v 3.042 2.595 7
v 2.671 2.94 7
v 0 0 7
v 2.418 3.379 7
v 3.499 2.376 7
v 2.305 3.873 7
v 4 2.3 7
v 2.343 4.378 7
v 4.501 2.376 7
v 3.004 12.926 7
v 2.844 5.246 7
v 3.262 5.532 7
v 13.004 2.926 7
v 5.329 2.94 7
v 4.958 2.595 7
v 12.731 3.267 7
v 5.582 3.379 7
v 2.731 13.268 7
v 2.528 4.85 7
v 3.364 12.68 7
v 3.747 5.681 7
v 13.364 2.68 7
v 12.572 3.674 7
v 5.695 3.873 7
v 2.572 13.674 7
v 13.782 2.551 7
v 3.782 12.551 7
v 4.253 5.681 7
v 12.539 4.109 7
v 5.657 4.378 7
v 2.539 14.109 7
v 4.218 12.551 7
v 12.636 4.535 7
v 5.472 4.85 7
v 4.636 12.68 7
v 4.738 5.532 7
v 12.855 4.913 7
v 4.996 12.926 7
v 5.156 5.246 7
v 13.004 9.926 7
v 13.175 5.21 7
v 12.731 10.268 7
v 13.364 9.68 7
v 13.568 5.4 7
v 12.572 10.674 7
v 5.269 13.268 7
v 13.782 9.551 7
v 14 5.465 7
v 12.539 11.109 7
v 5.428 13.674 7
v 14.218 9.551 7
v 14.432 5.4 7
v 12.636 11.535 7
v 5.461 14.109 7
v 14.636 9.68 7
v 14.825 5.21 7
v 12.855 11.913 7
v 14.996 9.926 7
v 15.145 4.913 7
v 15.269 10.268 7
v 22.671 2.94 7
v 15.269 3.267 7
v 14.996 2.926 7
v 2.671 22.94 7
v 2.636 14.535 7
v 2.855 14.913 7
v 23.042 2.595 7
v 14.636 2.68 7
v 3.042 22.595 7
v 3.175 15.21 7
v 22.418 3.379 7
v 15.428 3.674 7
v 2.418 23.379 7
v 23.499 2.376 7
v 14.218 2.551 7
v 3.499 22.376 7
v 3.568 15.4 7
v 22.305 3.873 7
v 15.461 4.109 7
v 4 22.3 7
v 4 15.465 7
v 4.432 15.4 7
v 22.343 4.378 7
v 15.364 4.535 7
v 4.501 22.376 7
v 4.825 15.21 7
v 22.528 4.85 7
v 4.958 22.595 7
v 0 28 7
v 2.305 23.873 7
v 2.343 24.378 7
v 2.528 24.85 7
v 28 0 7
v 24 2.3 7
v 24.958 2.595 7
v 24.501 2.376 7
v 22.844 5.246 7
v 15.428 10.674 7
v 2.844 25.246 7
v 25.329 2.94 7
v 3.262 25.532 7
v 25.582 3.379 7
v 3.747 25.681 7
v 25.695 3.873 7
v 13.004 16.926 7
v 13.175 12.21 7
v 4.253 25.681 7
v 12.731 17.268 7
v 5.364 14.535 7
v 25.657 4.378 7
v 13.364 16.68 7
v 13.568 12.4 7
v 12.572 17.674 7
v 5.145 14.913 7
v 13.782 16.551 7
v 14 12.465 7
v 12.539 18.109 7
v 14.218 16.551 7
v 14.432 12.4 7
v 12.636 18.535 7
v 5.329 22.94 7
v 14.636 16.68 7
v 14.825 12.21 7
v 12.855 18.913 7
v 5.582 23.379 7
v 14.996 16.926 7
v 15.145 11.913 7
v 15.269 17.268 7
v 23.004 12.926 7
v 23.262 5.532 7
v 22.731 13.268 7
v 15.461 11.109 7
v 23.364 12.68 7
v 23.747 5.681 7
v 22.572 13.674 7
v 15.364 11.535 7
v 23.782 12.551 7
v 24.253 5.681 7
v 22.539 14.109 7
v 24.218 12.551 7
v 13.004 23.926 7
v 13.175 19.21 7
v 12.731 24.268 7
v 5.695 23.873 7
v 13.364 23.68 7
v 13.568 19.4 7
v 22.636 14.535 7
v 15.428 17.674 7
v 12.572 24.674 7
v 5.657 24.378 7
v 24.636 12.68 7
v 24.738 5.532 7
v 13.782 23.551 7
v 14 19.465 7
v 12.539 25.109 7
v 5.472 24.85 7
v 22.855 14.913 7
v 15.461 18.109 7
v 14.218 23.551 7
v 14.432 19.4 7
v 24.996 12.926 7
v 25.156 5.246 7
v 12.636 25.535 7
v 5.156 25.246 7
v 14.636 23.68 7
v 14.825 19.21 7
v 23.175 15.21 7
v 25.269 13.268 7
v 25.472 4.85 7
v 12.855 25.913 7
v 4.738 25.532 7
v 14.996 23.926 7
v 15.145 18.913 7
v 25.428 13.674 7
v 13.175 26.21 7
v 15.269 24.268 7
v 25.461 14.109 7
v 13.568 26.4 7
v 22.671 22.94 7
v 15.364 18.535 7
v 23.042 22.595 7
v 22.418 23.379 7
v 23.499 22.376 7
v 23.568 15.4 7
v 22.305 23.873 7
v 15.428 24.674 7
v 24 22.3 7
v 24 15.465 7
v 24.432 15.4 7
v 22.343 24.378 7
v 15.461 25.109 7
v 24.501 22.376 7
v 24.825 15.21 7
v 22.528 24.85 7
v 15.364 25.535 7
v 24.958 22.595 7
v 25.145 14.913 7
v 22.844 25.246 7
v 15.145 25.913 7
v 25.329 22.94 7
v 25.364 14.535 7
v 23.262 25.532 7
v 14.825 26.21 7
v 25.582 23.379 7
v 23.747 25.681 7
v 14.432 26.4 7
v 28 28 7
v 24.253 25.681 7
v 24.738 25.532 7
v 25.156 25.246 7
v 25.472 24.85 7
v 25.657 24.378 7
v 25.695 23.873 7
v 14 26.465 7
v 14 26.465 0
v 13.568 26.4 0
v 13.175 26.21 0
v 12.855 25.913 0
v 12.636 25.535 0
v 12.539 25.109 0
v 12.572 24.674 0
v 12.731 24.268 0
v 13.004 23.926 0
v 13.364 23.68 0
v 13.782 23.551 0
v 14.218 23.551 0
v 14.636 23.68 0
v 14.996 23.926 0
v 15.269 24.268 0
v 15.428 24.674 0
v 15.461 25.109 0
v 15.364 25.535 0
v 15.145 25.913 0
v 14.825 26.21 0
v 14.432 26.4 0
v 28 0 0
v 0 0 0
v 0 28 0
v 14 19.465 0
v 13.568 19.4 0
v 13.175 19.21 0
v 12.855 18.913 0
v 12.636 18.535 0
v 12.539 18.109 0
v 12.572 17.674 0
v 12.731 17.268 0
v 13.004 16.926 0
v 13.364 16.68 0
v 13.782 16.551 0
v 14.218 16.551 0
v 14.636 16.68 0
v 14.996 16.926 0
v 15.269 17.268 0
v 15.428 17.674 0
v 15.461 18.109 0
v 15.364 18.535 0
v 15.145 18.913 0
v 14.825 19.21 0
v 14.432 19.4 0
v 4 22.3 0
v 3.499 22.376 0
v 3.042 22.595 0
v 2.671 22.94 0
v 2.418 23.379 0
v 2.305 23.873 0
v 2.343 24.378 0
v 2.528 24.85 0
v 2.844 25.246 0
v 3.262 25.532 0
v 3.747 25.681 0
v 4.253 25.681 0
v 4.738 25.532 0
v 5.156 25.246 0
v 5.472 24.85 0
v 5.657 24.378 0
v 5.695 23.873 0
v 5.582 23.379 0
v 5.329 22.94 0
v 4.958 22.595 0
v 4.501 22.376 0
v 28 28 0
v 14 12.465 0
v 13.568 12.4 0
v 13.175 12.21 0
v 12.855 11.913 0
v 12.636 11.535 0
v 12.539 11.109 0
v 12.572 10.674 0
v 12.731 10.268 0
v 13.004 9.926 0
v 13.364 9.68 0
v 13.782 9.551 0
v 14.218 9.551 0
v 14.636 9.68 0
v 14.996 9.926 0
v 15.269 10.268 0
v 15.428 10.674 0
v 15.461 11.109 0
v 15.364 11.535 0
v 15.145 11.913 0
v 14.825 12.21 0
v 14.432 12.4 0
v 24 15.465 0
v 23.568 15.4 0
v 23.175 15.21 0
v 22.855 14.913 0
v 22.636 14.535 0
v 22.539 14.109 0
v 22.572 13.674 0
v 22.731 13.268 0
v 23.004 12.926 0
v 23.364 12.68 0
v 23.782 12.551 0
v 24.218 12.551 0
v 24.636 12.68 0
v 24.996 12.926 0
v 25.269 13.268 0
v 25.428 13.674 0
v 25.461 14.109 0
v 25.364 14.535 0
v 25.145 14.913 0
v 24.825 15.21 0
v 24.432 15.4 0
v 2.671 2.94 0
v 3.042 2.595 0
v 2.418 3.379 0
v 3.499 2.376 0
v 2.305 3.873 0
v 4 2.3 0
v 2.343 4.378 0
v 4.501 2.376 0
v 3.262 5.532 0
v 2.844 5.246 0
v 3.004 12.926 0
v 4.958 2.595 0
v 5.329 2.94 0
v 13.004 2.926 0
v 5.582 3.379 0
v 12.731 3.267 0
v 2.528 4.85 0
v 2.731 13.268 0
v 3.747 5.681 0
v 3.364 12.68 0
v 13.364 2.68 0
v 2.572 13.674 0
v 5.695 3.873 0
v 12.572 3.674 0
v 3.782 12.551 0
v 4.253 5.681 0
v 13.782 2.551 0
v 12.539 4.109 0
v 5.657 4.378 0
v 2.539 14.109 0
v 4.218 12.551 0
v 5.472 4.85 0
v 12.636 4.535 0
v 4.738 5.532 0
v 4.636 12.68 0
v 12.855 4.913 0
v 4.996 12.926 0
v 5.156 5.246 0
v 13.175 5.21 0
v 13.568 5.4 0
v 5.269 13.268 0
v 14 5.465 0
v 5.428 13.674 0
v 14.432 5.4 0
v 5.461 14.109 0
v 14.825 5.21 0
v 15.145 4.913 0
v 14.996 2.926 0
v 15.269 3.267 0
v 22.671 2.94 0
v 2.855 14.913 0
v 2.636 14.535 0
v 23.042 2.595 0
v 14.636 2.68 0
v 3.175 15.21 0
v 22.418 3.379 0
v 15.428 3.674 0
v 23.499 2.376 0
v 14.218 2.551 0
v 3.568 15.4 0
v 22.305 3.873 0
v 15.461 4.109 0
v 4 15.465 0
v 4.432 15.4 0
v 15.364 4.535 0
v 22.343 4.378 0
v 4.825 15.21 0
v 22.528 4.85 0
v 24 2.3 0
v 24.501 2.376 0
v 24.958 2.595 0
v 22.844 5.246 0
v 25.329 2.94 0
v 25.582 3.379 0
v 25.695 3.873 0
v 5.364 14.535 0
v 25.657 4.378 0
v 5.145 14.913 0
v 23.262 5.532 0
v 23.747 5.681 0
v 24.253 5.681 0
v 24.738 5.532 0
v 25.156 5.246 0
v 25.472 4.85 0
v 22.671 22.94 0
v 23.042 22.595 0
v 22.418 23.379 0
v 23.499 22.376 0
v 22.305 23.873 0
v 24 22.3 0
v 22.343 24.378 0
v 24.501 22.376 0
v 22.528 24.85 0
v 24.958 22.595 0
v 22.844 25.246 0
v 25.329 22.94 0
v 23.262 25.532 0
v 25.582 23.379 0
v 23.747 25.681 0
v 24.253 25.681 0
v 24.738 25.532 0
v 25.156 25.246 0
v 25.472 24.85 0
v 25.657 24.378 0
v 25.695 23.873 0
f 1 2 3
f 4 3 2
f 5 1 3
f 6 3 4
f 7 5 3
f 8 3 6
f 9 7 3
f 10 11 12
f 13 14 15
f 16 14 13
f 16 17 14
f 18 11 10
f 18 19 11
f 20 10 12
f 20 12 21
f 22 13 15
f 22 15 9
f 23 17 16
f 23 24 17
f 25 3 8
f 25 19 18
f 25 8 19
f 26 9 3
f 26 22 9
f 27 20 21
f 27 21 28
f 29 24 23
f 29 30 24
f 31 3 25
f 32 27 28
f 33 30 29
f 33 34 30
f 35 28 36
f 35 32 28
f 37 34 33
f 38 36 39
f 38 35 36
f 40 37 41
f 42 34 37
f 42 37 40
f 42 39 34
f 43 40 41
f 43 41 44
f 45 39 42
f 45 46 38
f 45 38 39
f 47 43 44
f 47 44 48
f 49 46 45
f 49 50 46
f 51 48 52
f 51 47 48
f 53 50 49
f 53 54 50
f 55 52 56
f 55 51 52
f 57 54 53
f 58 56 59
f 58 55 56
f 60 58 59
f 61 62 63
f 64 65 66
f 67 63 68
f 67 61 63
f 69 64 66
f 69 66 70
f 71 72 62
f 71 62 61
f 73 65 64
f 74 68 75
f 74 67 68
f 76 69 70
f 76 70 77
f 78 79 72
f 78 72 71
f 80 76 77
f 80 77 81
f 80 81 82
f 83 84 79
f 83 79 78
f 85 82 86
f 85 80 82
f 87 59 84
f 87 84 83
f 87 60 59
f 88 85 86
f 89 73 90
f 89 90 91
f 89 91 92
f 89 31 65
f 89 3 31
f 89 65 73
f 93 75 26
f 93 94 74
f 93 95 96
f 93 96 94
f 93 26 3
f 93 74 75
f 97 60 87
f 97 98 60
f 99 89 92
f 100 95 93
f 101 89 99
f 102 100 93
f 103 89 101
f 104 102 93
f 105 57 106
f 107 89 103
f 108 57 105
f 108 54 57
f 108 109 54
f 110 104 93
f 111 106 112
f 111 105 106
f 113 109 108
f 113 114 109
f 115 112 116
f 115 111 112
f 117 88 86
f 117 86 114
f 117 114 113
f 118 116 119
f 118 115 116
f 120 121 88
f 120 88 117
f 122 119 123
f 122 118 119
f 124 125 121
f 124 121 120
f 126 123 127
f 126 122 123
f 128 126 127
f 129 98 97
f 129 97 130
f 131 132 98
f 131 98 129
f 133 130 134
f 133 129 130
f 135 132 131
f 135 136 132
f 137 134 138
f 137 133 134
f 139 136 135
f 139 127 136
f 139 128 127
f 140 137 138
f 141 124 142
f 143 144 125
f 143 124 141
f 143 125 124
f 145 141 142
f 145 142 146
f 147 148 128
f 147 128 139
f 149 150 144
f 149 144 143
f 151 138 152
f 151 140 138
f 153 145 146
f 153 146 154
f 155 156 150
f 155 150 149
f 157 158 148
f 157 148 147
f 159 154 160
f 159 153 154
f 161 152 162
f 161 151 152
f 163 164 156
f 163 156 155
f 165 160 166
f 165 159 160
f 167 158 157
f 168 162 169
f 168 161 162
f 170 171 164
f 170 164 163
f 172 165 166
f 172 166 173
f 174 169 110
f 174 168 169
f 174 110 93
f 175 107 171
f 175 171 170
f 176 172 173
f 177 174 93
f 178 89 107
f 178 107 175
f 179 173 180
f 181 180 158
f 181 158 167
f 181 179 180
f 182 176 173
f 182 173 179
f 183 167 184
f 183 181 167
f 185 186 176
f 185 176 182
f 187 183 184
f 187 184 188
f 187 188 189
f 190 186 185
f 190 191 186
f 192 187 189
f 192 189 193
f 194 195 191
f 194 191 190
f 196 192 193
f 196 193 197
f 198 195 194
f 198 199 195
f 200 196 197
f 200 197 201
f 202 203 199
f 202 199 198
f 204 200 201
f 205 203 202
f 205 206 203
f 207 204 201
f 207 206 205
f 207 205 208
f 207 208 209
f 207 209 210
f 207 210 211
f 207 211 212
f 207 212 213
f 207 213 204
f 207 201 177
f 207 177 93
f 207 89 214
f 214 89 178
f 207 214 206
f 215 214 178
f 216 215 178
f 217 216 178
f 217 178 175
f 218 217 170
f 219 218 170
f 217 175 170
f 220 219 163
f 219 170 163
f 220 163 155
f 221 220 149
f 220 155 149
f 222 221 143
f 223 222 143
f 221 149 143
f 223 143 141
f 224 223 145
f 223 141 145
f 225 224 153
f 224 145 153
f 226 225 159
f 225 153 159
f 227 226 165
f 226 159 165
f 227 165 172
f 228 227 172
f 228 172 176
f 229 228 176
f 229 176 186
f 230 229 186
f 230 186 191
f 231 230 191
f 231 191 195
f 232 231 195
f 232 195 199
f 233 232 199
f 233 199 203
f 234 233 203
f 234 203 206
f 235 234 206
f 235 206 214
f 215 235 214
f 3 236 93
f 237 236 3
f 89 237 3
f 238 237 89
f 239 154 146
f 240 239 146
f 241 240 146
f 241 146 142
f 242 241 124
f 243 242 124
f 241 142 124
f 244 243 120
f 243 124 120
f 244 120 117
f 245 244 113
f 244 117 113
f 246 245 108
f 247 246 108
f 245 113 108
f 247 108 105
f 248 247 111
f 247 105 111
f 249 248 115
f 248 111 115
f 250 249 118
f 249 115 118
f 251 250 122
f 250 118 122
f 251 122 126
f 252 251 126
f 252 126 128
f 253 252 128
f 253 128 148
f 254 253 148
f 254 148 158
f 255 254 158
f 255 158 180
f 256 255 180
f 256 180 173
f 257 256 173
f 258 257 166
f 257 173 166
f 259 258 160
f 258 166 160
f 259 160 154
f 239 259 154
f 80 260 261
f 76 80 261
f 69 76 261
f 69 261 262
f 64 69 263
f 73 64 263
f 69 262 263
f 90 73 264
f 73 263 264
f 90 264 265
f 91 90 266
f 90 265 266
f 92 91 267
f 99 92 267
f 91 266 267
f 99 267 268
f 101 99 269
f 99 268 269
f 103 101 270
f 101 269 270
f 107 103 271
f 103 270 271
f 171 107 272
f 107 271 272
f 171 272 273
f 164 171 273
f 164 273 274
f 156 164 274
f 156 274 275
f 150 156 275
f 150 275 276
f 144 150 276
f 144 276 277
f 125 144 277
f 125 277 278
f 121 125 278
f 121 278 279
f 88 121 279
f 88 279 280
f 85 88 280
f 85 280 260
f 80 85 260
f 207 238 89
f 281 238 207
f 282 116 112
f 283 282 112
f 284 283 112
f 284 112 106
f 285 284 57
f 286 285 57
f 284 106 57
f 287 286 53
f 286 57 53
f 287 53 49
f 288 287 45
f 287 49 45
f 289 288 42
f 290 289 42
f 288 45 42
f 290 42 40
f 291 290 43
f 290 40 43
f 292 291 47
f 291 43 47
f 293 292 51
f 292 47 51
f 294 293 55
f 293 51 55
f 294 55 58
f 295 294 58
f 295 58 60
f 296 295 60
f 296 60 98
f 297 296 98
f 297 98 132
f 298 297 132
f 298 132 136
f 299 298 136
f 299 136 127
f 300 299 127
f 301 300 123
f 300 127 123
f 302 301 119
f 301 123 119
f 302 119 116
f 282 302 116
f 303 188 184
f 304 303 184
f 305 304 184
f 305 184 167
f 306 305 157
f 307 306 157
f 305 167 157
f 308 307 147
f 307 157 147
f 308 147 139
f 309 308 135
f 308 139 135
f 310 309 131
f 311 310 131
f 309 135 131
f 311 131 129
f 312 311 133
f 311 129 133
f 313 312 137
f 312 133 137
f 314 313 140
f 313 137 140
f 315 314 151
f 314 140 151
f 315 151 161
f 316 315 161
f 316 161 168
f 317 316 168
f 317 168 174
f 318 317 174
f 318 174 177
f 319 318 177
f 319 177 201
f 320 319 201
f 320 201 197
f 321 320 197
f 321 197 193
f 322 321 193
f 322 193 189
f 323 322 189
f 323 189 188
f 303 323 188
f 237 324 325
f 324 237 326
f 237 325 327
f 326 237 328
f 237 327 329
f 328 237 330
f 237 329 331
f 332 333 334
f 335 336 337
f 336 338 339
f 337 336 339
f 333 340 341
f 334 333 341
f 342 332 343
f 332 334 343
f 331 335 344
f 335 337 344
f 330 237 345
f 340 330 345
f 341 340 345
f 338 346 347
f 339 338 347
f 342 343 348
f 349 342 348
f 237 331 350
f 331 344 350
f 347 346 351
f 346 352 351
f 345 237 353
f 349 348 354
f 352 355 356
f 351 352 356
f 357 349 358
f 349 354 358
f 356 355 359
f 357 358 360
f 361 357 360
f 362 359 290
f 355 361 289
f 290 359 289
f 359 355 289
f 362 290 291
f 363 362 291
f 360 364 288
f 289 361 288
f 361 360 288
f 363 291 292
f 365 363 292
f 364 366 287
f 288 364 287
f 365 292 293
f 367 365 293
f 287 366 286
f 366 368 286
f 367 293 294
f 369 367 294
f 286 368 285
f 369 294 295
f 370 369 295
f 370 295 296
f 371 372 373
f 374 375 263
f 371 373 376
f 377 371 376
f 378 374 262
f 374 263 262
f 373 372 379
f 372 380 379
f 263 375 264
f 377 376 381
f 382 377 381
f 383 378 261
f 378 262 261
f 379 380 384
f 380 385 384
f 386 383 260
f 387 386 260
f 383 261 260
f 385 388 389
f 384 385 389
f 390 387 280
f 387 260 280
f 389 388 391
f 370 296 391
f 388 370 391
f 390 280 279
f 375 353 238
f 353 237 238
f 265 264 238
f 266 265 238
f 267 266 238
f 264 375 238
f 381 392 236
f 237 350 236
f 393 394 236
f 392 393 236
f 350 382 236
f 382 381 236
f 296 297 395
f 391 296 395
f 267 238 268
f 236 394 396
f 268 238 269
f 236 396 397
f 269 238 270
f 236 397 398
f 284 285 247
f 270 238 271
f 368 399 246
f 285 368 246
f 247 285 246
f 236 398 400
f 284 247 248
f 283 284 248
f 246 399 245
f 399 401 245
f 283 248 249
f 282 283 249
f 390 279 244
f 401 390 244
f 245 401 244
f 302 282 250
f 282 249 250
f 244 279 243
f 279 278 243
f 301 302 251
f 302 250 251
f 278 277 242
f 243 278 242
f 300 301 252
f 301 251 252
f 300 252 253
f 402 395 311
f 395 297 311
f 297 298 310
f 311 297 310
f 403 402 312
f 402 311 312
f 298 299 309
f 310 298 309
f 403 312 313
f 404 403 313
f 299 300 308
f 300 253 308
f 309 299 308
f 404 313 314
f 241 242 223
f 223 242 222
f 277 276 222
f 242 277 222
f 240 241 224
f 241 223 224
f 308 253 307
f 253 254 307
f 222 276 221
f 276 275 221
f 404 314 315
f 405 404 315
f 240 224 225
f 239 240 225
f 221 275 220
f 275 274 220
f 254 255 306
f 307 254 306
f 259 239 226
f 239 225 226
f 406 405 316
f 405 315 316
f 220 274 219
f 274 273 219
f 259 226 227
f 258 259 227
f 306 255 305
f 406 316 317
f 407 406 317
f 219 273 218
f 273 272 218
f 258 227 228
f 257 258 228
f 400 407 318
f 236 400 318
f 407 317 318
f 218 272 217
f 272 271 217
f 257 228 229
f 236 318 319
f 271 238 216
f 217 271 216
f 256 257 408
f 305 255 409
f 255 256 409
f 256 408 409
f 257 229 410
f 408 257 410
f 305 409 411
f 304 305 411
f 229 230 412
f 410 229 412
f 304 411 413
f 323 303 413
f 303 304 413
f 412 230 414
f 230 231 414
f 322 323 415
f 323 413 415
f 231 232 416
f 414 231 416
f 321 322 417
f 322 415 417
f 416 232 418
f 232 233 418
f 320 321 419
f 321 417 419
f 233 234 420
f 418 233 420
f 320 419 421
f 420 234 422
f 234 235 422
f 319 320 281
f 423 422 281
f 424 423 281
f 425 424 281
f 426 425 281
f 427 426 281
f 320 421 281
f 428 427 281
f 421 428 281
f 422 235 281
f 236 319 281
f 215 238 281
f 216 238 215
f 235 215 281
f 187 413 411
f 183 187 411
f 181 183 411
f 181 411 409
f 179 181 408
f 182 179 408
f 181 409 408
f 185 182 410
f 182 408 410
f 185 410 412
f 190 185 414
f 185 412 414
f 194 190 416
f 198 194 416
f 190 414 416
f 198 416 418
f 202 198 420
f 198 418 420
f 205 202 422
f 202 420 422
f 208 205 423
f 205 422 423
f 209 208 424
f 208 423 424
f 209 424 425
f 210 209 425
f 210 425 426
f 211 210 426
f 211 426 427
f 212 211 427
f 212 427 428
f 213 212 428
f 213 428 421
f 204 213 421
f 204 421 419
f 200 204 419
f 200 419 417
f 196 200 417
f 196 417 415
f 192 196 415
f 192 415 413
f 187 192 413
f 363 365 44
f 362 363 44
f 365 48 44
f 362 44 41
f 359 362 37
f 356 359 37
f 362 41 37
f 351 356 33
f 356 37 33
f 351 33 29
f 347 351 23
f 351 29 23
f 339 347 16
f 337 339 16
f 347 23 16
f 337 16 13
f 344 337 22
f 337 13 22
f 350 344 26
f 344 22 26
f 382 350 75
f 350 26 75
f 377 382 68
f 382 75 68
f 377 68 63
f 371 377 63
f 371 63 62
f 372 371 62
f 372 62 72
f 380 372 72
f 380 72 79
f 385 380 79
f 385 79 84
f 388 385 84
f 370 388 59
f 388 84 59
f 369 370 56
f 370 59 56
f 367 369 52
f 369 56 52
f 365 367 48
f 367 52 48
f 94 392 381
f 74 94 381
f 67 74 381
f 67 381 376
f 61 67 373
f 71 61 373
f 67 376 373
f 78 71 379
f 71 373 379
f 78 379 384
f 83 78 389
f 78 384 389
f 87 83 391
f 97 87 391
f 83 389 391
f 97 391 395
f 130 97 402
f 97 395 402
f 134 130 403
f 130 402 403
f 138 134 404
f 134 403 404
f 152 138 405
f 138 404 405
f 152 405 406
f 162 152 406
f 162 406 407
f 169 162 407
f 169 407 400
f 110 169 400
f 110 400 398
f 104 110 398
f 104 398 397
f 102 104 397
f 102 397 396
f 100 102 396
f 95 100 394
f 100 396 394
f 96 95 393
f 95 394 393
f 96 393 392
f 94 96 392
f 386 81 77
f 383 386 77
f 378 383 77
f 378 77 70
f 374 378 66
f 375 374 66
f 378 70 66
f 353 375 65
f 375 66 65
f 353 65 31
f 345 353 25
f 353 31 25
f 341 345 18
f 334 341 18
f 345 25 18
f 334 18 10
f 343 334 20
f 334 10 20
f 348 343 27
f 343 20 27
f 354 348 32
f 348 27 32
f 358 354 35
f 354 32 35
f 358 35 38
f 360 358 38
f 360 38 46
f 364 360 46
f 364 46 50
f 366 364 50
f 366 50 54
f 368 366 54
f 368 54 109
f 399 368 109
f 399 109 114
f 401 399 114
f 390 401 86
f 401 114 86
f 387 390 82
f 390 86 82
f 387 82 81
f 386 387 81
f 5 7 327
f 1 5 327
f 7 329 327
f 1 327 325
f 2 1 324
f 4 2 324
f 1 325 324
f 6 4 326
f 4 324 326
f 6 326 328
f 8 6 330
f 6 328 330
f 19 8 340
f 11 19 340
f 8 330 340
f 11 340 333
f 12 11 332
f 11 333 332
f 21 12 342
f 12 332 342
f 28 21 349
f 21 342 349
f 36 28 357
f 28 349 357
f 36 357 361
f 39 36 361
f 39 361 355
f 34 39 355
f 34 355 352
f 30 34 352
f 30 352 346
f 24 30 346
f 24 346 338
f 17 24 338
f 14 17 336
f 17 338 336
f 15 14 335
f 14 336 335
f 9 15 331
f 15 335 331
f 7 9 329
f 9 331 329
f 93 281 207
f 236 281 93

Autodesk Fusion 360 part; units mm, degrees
sketch "Sketch1" plane through (0, 0, 0) normal (0, 0, 1) x (1, 0, 0)
  line L0 (0, 28) -> (28, 28)
  line L1 (28, 28) -> (28, 0)
  line L2 (28, 0) -> (0, 0)
  line L3 (0, 0) -> (0, 28)
  dimension "d1" = 28
  dimension "d2" = 28
  dimension "d13" = 28
  dimension "d14" = 28
sketch "Sketch2" plane through (0, 0, 0) normal (0, 0, 1) x (1, 0, 0)
  circle A0 centre (4, 24) radius 1.5
  circle A1 centre (4, 4) radius 1.5
  circle A2 centre (24, 4) radius 1.5
  circle A3 centre (24, 24) radius 1.5
  circle A4 centre (4, 14) radius 1.5
  circle A5 centre (14, 25) radius 1.5
  circle A6 centre (14, 18) radius 1.5
  circle A7 centre (14, 4) radius 1.5
  circle A8 centre (24, 14) radius 1.5
  circle A9 centre (14, 11) radius 1.5
  dimension "d15" = 3
  dimension "d16" = 3
  dimension "d17" = 3
  dimension "d18" = 3
  dimension "d19" = 3
  dimension "d20" = 3
  dimension "d21" = 3
  dimension "d22" = 3
  dimension "d23" = 3
  dimension "d24" = 3
  dimension "d25" = 10
  dimension "d26" = 10
  dimension "d27" = 10
  dimension "d28" = 10
  dimension "d29" = 10
  dimension "d30" = 10
  dimension "d31" = 7
  dimension "d32" = 7
  dimension "d33" = 7
extrude "Extrude1" add sketch "Sketch1" along normal blind 7
hole "Hole1" at (14, 25, 0) at (4, 14, 0) at (14, 18, 0) at (14, 11, 0) at (24, 14, 0) at (14, 4, 0) direction (0, 0, 1) diameter 2.93 depth 7 tip angle 180
sketch "Sketch3" plane through (0, 0, 7) normal (0, 0, 1) x (-1, 0, 0)
  circle A0 centre (-24, -14) radius 1.465
  circle A1 centre (-14, -18) radius 1.465
  circle A2 centre (-14, -25) radius 1.465
  circle A3 centre (-4, -14) radius 1.465
  circle A4 centre (-14, -11) radius 1.465
  circle A5 centre (-14, -4) radius 1.465
  line L0 (0, 0) -> (-28, 0)
  line L1 (-28, 0) -> (-28, -28)
  line L2 (-28, -28) -> (0, -28)
  line L3 (0, -28) -> (0, 0)
  circle A6 centre (-4, -24) radius 2
  circle A7 centre (-4, -4) radius 2
  circle A8 centre (-24, -4) radius 2
  circle A9 centre (-24, -24) radius 2
hole "Hole2" at (4, 24, 7) at (24, 24, 7) at (24, 4, 7) at (4, 4, 7) direction (0, 0, -1) diameter 3.4 depth 7 tip angle 180
